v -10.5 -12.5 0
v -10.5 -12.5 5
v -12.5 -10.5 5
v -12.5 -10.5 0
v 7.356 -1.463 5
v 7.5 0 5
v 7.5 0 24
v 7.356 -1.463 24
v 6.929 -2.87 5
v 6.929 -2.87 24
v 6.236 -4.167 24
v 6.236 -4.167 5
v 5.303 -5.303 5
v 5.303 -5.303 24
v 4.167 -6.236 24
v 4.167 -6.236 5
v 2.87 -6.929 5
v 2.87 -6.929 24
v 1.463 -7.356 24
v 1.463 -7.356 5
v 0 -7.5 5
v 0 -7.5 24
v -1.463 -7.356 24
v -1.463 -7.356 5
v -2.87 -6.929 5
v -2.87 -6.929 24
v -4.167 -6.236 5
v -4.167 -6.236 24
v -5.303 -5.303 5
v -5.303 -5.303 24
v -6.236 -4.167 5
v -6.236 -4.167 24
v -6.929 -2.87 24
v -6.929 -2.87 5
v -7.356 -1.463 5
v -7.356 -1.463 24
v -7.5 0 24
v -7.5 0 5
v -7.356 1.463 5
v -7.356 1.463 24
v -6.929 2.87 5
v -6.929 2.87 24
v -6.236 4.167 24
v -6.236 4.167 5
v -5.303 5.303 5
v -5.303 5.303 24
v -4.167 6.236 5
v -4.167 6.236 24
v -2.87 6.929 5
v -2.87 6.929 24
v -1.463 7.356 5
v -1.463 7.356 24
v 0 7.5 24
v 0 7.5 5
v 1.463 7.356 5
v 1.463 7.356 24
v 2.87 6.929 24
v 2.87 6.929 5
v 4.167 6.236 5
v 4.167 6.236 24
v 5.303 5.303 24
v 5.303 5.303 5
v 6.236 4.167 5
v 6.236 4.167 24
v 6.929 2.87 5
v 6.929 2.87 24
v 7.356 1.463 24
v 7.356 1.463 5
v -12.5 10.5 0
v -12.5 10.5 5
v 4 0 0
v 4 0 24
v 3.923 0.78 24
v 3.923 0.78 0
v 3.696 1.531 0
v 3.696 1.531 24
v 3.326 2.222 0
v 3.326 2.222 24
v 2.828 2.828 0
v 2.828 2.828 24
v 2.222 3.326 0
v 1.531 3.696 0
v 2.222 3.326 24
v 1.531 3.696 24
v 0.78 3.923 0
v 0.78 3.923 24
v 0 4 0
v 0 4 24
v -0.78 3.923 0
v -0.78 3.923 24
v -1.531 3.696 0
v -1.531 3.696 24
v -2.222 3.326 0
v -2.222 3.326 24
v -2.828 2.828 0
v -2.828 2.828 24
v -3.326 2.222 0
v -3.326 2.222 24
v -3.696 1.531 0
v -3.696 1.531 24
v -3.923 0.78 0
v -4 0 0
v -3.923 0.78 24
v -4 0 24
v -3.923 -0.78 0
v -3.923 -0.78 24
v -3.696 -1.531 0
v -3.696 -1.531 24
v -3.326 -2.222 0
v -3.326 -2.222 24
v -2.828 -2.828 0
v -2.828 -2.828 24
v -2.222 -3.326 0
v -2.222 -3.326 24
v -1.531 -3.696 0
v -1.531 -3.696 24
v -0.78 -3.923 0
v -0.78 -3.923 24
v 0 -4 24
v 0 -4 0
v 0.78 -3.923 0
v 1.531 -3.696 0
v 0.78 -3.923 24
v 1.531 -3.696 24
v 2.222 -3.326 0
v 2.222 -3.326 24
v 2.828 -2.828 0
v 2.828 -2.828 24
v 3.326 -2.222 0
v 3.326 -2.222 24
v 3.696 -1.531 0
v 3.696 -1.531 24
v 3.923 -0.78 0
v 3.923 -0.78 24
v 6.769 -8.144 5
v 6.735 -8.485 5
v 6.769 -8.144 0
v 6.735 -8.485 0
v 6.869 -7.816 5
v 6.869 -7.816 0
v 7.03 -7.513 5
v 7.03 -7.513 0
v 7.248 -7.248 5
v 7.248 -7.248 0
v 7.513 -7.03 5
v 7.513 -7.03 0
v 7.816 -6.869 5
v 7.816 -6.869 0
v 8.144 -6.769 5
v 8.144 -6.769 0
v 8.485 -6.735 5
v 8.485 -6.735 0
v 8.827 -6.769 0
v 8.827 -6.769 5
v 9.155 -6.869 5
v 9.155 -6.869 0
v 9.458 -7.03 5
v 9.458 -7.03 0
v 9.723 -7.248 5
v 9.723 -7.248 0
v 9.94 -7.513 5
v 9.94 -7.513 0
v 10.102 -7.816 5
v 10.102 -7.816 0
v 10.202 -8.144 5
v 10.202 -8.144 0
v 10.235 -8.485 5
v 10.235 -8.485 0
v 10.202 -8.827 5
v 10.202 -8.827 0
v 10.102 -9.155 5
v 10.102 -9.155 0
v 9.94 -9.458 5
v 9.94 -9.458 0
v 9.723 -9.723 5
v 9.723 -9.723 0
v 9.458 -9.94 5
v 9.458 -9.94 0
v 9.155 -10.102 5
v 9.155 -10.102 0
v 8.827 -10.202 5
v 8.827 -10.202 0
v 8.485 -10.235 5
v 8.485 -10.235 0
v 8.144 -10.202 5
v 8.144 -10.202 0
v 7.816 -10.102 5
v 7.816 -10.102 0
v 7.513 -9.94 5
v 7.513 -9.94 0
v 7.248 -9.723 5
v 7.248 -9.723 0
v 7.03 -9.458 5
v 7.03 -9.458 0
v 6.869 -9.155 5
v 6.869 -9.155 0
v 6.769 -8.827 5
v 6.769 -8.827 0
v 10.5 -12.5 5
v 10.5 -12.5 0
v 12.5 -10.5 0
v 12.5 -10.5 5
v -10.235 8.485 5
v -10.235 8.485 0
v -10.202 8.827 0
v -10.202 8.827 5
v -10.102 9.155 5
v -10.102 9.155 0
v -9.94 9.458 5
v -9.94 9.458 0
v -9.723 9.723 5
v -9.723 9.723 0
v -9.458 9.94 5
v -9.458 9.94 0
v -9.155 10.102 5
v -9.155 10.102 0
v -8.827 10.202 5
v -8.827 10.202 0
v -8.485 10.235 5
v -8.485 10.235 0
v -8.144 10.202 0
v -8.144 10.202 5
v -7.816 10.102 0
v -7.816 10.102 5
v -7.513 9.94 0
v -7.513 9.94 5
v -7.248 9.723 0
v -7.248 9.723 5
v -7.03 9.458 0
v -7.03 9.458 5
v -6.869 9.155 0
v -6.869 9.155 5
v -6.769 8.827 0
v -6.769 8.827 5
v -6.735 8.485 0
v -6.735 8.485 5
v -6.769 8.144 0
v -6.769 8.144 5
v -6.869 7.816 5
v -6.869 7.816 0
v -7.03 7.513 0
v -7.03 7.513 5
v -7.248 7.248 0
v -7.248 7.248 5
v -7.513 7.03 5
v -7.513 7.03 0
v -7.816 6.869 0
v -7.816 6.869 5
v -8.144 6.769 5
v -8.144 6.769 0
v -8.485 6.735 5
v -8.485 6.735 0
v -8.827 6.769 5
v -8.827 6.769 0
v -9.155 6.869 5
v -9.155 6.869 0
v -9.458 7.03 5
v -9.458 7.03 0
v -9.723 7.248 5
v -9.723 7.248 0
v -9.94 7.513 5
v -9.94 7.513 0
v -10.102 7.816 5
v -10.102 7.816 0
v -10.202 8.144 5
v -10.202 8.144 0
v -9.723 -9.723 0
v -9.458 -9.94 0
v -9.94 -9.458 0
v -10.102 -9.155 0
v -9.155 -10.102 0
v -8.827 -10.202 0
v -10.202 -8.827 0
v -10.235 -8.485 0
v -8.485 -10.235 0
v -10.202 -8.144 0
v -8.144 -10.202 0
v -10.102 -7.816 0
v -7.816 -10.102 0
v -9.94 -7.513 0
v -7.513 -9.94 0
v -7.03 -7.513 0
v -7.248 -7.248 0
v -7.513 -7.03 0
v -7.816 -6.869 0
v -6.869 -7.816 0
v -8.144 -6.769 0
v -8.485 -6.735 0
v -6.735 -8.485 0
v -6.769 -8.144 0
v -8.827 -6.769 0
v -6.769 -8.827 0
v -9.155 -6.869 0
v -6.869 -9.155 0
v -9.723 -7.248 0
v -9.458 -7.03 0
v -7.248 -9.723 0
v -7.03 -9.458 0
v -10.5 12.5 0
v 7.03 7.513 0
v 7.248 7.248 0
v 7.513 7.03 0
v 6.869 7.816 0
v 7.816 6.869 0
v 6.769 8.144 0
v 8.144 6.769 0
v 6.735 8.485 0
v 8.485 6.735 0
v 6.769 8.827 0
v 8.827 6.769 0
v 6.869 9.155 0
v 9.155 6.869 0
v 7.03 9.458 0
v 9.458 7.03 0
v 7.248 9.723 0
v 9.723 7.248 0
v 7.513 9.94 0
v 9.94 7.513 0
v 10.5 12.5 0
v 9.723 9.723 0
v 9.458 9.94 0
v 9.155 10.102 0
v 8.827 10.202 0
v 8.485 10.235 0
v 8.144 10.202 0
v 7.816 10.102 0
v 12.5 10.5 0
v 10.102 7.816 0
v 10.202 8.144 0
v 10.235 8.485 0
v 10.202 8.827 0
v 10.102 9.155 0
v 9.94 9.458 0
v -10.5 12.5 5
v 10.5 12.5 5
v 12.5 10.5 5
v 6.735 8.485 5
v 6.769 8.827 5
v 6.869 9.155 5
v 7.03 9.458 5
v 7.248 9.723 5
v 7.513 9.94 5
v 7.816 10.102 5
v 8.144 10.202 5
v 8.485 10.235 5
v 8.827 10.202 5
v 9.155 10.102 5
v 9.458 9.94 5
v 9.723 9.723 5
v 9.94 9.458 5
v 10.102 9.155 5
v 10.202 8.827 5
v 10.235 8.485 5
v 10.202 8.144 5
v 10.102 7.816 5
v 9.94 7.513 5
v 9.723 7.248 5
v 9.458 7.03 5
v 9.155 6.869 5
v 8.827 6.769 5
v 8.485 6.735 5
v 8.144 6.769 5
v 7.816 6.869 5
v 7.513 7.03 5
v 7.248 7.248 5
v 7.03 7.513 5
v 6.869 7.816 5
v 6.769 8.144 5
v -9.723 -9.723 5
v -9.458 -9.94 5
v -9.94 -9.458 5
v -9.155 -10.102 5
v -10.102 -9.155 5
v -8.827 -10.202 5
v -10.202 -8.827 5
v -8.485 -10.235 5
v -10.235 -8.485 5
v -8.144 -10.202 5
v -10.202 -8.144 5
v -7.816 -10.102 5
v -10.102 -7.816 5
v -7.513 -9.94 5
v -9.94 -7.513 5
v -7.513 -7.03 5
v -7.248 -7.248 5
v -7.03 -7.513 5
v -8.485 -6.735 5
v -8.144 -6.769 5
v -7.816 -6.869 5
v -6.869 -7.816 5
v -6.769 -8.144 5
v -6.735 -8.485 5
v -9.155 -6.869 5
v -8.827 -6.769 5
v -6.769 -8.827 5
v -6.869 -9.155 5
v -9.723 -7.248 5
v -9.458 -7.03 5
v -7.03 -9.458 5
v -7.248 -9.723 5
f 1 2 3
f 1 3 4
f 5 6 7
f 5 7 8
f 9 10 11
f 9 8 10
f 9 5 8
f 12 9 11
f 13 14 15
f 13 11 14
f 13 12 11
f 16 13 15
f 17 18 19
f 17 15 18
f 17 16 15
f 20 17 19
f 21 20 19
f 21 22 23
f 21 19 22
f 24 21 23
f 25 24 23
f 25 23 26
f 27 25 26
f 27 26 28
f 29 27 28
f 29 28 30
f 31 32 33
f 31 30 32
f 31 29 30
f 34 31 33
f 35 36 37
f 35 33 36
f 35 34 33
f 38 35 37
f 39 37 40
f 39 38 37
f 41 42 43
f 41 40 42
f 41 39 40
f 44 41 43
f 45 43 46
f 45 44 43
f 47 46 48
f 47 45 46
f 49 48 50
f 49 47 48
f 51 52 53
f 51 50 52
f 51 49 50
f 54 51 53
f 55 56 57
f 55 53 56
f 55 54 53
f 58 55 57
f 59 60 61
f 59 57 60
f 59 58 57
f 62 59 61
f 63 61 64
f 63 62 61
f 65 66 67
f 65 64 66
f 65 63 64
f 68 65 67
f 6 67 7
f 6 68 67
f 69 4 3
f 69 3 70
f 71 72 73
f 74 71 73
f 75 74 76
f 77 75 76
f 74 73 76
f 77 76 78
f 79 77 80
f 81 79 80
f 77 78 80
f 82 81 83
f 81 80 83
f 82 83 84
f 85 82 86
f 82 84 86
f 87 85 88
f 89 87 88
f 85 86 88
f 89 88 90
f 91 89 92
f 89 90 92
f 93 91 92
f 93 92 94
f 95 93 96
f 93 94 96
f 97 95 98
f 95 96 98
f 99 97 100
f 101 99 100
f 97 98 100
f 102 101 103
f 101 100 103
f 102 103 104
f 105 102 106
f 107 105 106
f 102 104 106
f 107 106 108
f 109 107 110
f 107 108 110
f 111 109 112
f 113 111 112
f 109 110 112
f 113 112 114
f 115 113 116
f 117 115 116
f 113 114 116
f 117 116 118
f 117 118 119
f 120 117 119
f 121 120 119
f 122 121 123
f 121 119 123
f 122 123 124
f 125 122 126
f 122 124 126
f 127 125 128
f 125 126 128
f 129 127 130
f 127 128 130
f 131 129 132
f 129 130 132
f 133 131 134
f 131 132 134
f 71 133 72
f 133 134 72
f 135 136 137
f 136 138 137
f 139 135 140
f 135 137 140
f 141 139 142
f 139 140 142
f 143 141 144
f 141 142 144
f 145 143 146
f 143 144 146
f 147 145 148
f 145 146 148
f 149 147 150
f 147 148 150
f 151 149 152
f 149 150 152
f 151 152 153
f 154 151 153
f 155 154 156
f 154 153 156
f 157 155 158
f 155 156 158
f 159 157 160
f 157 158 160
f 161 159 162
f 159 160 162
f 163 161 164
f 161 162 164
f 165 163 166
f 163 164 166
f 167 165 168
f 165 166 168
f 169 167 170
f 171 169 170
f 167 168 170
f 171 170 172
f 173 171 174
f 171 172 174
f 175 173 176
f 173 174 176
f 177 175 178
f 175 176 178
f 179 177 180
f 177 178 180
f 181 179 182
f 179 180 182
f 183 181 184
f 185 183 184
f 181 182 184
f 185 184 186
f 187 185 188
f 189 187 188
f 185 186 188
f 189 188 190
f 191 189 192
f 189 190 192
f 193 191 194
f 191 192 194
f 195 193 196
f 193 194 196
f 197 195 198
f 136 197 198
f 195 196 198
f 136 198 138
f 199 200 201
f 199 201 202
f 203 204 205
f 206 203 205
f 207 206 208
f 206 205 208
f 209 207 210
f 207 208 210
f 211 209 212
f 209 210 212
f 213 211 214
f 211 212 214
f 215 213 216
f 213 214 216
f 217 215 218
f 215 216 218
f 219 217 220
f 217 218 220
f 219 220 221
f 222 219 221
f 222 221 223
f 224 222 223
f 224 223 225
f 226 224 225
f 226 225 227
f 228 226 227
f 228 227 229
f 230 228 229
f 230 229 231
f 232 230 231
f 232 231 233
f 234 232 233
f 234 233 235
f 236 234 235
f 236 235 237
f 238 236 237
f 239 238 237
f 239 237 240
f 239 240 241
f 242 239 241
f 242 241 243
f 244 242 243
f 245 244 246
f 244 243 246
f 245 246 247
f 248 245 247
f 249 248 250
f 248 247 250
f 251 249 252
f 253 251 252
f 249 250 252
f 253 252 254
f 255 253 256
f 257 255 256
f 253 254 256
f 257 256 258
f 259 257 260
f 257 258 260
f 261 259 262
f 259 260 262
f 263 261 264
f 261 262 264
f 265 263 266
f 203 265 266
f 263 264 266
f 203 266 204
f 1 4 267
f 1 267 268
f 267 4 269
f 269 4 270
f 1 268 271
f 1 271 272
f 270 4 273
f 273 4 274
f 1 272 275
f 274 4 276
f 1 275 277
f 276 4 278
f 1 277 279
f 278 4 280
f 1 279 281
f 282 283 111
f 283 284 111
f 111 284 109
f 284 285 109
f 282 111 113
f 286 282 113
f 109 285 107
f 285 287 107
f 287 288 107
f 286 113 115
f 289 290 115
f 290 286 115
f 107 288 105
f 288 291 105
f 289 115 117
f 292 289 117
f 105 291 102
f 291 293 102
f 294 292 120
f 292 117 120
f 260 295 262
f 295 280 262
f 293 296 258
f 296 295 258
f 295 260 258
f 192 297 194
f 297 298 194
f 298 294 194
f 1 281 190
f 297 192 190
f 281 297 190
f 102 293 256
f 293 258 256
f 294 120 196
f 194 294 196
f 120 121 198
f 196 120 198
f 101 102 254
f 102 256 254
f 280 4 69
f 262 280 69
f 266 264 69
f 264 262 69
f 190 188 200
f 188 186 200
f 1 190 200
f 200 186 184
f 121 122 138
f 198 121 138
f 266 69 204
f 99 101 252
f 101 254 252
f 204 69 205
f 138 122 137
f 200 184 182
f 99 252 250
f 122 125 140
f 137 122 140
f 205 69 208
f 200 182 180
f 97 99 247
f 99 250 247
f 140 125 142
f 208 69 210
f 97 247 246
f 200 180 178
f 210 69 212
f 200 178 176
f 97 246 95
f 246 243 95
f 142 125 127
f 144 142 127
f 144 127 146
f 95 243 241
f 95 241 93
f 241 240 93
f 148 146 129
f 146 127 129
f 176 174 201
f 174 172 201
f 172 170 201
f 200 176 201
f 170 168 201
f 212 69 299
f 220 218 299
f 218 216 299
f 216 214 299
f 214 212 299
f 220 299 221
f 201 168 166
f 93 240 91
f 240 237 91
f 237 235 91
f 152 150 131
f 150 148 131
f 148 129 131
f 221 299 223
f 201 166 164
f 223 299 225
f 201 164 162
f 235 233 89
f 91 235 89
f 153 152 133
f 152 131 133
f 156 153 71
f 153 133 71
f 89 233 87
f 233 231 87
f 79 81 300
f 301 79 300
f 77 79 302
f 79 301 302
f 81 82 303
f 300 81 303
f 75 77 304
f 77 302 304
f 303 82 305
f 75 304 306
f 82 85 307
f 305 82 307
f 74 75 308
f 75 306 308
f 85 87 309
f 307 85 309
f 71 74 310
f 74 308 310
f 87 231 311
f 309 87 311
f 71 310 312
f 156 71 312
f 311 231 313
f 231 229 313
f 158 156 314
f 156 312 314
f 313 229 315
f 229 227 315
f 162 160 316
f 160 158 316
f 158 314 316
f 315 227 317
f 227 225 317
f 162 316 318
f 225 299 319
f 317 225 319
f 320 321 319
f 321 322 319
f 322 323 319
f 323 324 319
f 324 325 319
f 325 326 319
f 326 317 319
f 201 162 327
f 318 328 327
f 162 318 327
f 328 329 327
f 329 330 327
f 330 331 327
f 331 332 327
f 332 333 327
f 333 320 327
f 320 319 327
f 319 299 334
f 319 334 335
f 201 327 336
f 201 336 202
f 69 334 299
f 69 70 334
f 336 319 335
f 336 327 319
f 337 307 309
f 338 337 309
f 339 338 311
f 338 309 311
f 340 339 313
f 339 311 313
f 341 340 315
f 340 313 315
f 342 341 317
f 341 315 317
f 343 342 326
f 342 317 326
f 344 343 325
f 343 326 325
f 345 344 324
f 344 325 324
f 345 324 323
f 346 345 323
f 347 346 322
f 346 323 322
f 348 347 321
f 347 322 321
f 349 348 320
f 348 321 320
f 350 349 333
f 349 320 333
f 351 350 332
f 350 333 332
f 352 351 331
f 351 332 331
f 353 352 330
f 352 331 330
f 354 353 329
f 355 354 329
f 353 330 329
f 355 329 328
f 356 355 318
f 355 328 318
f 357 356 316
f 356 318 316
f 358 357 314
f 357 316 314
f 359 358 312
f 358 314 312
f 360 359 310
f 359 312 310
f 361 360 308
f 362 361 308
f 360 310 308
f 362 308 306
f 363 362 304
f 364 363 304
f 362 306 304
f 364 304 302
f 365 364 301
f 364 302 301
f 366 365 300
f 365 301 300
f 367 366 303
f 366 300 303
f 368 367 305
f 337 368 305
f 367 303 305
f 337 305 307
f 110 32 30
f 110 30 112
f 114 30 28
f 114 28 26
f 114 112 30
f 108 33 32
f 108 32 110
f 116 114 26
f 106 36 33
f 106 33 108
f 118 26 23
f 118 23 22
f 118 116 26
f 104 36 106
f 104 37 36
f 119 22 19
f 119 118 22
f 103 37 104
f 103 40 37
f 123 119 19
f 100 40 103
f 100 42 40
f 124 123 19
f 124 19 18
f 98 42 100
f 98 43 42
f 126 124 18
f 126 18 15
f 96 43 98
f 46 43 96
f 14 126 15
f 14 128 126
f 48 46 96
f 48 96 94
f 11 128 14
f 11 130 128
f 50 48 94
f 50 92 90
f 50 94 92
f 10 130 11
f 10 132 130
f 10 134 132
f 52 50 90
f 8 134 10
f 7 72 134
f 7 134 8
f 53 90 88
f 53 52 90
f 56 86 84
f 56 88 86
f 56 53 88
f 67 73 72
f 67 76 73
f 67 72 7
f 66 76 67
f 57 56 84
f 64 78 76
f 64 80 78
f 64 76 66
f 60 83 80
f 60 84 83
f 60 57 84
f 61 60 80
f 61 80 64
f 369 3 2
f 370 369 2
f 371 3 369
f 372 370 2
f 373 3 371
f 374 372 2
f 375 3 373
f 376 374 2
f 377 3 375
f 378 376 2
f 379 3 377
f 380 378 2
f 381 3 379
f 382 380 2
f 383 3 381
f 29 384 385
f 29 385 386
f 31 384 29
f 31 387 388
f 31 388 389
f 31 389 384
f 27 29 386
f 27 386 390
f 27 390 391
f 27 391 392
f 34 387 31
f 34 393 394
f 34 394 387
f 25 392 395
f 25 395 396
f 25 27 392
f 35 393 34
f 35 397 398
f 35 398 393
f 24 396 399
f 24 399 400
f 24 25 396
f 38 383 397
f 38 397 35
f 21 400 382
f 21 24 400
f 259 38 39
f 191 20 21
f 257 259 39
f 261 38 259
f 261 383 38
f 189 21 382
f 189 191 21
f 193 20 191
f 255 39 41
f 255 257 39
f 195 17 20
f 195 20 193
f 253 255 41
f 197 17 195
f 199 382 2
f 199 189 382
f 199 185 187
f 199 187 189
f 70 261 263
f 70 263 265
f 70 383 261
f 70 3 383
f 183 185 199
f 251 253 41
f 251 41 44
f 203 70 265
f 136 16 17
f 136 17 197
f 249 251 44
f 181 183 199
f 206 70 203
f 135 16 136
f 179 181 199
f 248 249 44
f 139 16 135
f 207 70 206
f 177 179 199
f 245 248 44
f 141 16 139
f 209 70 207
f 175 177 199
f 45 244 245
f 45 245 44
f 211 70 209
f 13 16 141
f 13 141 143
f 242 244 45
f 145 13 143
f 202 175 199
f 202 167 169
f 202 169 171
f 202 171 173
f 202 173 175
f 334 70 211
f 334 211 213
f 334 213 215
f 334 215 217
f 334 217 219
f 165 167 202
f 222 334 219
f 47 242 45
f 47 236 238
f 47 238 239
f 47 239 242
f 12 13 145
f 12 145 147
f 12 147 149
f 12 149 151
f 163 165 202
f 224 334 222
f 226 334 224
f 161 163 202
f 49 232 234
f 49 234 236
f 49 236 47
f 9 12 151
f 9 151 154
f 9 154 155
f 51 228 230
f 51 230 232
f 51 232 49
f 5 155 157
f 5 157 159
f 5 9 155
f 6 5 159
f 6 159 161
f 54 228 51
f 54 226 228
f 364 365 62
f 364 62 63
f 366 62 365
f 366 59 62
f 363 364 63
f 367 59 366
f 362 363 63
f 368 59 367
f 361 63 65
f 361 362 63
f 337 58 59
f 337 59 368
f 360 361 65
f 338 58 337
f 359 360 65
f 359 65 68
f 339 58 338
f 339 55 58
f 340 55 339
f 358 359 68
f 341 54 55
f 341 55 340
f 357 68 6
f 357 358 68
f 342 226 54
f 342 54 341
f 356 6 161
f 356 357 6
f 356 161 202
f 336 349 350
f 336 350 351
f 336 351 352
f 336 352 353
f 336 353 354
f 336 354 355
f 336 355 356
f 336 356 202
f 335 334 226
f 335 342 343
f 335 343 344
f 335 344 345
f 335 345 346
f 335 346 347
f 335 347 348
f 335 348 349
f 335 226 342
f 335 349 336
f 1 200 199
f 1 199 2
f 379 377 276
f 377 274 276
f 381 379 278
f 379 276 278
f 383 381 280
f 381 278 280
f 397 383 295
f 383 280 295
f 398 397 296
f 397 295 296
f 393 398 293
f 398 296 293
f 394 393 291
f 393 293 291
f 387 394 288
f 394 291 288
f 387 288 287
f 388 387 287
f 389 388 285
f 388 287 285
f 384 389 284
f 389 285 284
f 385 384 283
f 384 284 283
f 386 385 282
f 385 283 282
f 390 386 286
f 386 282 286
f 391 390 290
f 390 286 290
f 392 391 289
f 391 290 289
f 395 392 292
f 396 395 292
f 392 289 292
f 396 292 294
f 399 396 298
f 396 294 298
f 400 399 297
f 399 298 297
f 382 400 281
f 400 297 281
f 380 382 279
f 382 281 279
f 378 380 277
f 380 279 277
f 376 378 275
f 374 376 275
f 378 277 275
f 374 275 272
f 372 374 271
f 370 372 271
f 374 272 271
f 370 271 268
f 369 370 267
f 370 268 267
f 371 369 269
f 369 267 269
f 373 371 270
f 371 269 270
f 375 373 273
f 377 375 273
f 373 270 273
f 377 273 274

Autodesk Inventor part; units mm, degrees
ref_plane "YZ Plane" through (0, 0, 0) normal (1, 0, 0) x (0, 1, 0)
ref_plane "XZ Plane" through (0, 0, 0) normal (0, 1, 0) x (-1, 0, 0)
ref_plane "XY Plane" through (0, 0, 0) normal (0, 0, 1) x (1, 0, 0)
sketch "Sketch1" plane through (0, 0, 0) normal (0, 0, 1) x (1, 0, 0)
  line L0 (-12.5, 12.5) -> (12.5, 12.5)
  line L1 (12.5, 12.5) -> (12.5, -12.5)
  line L2 (12.5, -12.5) -> (-12.5, -12.5)
  line L3 (-12.5, -12.5) -> (-12.5, 12.5)
  line L4 (-12.5, 12.5) -> (12.5, -12.5) construction
  line L5 (12.5, 12.5) -> (-12.5, -12.5) construction
  point P0 (0, 0)
  dimension "d0" = 25
  dimension "d1" = 25
extrude "Extrusion1" add sketch "Sketch1" along normal blind 5
sketch "Sketch2" plane through (0, 0, 5) normal (0, 0, 1) x (1, 0, 0)
  circle A0 centre (0, 0) radius 7.5
  dimension "d4" = 15
extrude "Extrusion2" add sketch "Sketch2" along normal blind 19
sketch "Sketch3" plane through (0, 0, 24) normal (0, 0, 1) x (1, 0, 0)
  circle A0 centre (0, 0) radius 4
  dimension "d7" = 8
extrude "Extrusion3" cut sketch "Sketch3" against normal blind 30
sketch "Sketch4" plane through (0, 0, 0) normal (0, 0, -1) x (-1, 0, 0)
  circle A0 centre (0, 0) radius 12
  line L0 (-12.5, -12.5) -> (-12.5, 12.5) projected
  line L1 (12.5, 12.5) -> (12.5, -12.5) projected
  line L2 (-12.5, 12.5) -> (8.4853, -8.4853)
  circle A1 centre (8.4853, -8.4853) radius 1.75
  circle A2 centre (8.4853, 8.4853) radius 1.75
  circle A3 centre (-8.4853, 8.4853) radius 1.75
  circle A4 centre (-8.4853, -8.4853) radius 1.75
  dimension "d10" = 24
  dimension "d11" = 3.5
  dimension "d14" = 360
extrude "Extrusion4" cut sketch "Sketch4" against normal blind 30 contours A2 A0 | A0 A2 | A1 A0 | A0 L2 A1 | A0 A1 L2 | A3 L2 A0 | A0 L2 A3 | A3 A0 L2 | A0 A3 L2 | A4 A0 | A0 A4
chamfer "Chamfer1" distance 2 angle 45 4 edges at (12.5, 12.5, 2.5) (-12.5, 12.5, 2.5) (-12.5, -12.5, 2.5) (12.5, -12.5, 2.5)
properties part number "RODAMIENTO LINEAL"
